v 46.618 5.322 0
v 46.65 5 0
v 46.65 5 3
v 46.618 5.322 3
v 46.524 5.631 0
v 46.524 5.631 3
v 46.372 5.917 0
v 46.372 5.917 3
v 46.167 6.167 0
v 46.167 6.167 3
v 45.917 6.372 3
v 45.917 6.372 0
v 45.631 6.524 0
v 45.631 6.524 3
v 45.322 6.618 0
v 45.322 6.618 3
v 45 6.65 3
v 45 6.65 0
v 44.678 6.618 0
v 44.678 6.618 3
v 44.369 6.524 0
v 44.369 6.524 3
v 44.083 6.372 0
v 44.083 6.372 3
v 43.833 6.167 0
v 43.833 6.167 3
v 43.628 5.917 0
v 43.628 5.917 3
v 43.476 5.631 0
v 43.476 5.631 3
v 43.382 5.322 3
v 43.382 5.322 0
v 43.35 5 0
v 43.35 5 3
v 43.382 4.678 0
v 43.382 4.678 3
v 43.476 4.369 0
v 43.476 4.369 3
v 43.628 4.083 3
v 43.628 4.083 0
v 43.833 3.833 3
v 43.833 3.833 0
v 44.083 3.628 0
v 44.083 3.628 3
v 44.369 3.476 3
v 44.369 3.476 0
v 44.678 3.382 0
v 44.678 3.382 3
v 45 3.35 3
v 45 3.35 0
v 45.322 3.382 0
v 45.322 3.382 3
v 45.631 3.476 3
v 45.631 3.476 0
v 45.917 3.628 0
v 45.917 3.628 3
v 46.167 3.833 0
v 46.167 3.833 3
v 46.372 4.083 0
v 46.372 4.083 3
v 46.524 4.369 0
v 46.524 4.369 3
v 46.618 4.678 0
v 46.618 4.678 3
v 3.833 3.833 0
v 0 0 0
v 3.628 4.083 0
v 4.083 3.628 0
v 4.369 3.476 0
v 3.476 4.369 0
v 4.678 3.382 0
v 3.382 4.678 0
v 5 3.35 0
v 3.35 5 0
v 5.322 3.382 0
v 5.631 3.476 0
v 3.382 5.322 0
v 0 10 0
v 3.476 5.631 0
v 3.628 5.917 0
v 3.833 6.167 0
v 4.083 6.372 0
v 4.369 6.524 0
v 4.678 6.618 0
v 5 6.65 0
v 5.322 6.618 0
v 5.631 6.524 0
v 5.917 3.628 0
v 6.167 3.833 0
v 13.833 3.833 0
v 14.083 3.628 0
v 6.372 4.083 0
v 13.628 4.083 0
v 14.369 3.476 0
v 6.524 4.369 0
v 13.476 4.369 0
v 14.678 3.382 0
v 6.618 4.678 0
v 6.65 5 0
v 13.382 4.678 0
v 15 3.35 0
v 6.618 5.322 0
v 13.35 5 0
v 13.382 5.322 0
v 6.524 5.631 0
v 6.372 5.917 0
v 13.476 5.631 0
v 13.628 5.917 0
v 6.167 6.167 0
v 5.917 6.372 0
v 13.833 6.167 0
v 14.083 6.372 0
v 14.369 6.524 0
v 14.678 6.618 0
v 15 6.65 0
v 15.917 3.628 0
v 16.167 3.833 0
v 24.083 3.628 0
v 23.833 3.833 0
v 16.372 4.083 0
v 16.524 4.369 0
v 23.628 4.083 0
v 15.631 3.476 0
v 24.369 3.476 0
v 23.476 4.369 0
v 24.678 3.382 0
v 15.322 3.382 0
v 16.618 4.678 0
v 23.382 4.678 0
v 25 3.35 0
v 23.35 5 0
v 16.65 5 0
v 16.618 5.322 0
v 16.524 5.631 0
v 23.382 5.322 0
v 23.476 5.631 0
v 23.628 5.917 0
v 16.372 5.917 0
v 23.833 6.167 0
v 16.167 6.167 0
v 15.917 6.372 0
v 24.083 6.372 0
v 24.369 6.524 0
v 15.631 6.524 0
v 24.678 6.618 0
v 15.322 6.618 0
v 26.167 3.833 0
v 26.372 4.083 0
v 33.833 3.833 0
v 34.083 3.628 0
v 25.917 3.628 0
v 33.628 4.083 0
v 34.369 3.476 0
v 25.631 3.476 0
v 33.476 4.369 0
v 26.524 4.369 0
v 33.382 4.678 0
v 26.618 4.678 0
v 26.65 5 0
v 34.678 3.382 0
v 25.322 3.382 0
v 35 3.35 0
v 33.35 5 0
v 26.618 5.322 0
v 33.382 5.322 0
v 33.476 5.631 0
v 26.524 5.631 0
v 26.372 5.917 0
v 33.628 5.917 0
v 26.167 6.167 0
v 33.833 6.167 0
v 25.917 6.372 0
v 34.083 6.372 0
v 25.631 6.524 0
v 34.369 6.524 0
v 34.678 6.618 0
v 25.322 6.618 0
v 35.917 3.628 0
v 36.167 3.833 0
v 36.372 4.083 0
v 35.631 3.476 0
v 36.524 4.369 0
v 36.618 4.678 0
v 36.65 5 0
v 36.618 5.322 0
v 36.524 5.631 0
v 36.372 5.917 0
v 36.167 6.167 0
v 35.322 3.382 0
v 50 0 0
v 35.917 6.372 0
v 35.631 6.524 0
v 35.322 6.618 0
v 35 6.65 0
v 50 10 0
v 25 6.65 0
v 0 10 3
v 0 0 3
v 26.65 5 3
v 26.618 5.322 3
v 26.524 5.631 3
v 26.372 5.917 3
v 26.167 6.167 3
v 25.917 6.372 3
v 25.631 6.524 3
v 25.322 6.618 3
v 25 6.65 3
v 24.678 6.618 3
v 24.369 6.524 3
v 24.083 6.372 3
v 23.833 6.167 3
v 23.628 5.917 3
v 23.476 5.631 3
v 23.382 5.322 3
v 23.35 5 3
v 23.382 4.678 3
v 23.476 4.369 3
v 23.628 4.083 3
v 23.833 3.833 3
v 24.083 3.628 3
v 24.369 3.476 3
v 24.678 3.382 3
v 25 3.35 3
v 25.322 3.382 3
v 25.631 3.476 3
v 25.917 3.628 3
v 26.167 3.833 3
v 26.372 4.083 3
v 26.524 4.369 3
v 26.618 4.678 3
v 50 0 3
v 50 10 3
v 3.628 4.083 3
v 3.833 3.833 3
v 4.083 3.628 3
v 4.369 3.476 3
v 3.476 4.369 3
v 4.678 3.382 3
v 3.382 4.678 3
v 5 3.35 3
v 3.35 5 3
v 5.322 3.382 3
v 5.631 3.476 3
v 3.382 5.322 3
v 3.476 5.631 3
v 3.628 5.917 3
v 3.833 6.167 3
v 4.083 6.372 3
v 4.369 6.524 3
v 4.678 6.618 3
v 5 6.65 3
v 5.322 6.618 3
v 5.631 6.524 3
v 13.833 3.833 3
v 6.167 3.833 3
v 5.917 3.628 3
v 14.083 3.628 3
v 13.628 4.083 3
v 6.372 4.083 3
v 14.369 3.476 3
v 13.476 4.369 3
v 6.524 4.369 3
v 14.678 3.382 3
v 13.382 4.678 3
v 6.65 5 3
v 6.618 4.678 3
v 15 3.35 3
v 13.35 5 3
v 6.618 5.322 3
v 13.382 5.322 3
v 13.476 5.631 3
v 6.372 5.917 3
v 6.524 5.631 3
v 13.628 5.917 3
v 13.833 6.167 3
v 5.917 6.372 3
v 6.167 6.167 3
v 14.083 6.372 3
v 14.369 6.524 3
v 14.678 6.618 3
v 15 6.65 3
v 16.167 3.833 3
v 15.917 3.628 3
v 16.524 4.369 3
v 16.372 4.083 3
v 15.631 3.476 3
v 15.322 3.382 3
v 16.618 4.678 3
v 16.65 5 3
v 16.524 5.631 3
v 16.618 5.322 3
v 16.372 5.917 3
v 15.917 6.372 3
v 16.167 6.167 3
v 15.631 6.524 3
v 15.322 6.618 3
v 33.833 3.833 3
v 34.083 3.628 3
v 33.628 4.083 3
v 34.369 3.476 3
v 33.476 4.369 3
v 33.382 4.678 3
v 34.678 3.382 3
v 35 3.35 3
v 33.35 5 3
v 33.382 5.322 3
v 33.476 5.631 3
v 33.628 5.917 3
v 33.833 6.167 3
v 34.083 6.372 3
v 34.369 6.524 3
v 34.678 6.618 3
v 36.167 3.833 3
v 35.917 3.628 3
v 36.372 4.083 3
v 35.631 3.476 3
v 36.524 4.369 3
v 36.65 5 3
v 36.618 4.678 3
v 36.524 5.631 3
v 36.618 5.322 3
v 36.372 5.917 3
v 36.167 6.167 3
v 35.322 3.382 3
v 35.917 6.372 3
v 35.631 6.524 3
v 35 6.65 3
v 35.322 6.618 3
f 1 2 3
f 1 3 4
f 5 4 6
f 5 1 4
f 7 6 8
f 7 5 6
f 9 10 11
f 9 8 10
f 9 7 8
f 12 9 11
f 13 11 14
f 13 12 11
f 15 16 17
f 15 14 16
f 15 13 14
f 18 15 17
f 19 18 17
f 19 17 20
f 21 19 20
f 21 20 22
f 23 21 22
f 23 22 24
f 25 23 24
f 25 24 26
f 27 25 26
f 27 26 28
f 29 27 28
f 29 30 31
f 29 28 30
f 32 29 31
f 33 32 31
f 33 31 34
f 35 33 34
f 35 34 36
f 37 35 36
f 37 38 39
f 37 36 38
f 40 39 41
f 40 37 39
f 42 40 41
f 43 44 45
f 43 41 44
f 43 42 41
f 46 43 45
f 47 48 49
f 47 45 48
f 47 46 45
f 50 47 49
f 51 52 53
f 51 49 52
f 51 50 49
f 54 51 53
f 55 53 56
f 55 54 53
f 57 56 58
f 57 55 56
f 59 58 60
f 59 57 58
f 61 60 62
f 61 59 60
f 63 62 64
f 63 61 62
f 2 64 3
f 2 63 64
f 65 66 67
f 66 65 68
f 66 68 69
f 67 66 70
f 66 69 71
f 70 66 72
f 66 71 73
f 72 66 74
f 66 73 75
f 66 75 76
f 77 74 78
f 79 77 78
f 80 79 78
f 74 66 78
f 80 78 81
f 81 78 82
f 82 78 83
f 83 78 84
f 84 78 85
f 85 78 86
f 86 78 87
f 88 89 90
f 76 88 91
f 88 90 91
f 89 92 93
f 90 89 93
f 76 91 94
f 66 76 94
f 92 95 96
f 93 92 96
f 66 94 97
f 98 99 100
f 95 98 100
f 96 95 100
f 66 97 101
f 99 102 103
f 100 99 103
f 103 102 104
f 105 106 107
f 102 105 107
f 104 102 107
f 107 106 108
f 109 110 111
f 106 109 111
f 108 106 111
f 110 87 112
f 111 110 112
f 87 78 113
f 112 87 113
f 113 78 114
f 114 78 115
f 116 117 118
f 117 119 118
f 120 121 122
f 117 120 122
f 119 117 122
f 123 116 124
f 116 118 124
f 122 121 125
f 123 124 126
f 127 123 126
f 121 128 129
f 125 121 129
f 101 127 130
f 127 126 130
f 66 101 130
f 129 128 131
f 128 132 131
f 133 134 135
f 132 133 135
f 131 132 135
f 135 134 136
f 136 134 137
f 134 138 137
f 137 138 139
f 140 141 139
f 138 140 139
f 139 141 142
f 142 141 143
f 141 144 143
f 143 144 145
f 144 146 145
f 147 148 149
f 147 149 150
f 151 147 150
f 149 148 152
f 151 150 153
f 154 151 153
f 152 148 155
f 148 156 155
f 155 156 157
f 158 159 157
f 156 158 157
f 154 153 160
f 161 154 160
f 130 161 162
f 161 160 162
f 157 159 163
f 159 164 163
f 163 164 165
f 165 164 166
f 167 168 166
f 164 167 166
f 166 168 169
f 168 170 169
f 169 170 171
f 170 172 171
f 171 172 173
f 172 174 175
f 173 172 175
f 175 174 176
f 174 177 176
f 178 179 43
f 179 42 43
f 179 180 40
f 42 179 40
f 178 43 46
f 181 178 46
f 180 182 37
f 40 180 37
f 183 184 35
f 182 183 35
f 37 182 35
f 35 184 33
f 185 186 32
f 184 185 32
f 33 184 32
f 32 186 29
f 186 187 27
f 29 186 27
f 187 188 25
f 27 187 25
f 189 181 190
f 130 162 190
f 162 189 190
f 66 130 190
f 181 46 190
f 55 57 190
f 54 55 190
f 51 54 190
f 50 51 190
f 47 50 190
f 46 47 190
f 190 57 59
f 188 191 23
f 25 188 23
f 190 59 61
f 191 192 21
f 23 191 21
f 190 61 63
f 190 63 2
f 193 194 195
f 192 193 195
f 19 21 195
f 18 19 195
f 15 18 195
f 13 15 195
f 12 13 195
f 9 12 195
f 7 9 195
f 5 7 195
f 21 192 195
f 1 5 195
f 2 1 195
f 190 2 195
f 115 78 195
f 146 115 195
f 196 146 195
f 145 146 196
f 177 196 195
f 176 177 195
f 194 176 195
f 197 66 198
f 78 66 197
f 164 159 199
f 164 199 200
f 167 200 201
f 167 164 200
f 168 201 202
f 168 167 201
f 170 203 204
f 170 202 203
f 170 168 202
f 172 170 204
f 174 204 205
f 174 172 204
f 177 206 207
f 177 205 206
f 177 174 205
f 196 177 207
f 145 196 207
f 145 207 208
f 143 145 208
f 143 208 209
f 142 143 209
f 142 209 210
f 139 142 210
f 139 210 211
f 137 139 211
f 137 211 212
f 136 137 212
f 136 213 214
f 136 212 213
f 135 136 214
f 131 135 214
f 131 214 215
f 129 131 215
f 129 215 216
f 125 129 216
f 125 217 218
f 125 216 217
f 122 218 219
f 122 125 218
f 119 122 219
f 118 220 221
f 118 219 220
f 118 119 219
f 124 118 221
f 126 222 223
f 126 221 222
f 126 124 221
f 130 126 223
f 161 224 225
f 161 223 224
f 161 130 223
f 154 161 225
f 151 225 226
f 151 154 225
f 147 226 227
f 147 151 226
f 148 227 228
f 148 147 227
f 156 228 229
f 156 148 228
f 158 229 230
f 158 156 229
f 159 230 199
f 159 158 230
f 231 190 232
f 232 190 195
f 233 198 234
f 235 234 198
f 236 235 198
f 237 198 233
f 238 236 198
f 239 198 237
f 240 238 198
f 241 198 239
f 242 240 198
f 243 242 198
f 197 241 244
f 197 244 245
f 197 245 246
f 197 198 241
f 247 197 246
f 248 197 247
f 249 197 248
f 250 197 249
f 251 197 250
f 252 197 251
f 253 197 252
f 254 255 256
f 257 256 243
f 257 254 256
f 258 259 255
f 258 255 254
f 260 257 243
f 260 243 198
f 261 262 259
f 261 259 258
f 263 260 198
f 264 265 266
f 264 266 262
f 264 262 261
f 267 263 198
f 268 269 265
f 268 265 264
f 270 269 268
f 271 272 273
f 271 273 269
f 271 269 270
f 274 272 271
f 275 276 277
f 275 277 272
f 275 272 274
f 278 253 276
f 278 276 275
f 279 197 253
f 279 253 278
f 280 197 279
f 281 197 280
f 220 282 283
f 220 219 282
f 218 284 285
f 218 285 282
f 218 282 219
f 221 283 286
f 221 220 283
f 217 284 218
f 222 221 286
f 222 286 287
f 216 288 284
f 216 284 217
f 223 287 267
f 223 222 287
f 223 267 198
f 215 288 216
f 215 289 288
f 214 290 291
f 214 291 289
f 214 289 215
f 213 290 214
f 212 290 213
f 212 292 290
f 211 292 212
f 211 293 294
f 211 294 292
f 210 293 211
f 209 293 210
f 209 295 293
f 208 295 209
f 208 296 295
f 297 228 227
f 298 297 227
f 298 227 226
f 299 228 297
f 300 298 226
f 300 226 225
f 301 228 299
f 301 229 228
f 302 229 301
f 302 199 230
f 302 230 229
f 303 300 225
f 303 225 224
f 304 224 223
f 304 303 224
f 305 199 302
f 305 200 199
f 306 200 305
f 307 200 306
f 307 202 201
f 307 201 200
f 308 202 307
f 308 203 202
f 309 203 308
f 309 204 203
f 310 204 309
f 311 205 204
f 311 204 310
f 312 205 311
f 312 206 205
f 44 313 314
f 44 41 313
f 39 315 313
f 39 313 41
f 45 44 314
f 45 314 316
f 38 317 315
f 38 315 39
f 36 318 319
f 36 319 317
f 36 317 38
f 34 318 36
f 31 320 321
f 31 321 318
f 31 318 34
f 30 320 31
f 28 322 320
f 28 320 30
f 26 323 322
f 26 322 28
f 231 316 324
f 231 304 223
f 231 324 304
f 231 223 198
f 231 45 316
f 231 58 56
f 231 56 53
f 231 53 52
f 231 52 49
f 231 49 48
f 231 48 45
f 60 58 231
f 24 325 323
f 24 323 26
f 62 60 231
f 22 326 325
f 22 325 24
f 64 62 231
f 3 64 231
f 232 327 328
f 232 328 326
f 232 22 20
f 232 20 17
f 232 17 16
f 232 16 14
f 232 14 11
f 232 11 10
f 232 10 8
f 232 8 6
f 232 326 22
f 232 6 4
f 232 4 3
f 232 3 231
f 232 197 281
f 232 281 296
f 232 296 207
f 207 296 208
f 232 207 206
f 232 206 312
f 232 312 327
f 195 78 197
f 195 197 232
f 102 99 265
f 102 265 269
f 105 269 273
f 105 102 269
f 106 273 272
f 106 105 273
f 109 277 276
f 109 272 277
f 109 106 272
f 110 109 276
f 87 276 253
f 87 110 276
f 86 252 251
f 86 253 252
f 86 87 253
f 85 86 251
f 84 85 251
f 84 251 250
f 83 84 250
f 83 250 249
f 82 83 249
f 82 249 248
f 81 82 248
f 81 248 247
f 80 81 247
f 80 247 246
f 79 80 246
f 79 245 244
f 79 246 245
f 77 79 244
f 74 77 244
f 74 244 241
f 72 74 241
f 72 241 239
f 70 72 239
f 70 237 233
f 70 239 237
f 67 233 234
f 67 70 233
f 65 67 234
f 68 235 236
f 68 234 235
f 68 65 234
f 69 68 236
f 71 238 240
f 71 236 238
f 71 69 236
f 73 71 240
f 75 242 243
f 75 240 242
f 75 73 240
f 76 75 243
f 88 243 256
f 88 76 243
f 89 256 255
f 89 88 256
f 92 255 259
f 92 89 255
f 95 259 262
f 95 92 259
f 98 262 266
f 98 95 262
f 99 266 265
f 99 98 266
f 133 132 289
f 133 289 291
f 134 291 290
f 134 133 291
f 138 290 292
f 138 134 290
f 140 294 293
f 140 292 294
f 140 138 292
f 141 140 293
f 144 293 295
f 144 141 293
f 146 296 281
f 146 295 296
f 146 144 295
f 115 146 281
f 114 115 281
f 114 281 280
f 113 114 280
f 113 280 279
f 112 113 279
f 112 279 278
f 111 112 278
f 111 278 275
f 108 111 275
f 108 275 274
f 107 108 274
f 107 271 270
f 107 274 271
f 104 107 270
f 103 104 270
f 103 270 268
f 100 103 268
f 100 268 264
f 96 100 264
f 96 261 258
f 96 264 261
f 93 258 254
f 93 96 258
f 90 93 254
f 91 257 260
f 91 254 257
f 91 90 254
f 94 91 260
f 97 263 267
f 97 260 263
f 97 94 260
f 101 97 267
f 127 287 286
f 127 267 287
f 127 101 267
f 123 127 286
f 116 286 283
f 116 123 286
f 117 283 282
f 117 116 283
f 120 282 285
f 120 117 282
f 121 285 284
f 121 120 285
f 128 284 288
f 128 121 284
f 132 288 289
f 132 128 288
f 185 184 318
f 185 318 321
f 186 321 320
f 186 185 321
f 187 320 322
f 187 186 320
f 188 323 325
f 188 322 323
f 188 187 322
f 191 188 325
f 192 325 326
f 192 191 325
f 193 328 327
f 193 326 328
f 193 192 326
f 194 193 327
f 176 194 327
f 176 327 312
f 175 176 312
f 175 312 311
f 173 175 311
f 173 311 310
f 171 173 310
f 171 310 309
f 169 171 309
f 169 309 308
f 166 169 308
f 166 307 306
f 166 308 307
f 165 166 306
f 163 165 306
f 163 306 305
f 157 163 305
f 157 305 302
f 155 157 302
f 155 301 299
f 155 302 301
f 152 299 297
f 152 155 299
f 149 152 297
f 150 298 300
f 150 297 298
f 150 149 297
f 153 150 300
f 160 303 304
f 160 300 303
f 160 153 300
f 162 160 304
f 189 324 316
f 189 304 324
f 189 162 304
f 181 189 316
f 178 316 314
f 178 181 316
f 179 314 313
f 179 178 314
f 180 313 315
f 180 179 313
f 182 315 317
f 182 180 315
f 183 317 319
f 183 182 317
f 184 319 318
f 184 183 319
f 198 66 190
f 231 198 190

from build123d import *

# Parameters (mm, degrees)
CYLINDER001_R     = 1.65
CYLINDER001_DEPTH = 10
CYLINDER002_R     = 1.65
CYLINDER002_DEPTH = 10
CYLINDER003_R     = 1.65
CYLINDER003_DEPTH = 10
CYLINDER004_R     = 1.65
CYLINDER004_DEPTH = 10
CYLINDER_R        = 1.65
CYLINDER_DEPTH    = 10
BOX_W             = 50
BOX_H             = 10
BOX_DEPTH         = 3


with BuildPart() as taladro002:
    # Cylinder001 → Cylinder001 (new body)
    with BuildSketch(Plane(origin=(15, 5, -4), x_dir=(1, 0, 0), z_dir=(0, 0, 1))):
        Circle(CYLINDER001_R)
    extrude(amount=CYLINDER001_DEPTH)


with BuildPart() as taladro003:
    # Cylinder002 → Cylinder002 (new body)
    with BuildSketch(Plane(origin=(25, 5, -4), x_dir=(1, 0, 0), z_dir=(0, 0, 1))):
        Circle(CYLINDER002_R)
    extrude(amount=CYLINDER002_DEPTH)


with BuildPart() as taladro004:
    # Cylinder003 → Cylinder003 (new body)
    with BuildSketch(Plane(origin=(35, 5, -4), x_dir=(1, 0, 0), z_dir=(0, 0, 1))):
        Circle(CYLINDER003_R)
    extrude(amount=CYLINDER003_DEPTH)


with BuildPart() as taladro005:
    # Cylinder004 → Cylinder004 (new body)
    with BuildSketch(Plane(origin=(45, 5, -4), x_dir=(1, 0, 0), z_dir=(0, 0, 1))):
        Circle(CYLINDER004_R)
    extrude(amount=CYLINDER004_DEPTH)


with BuildPart() as taladros:
    # Cylinder → Cylinder (new body)
    with BuildSketch(Plane(origin=(5, 5, -4), x_dir=(1, 0, 0), z_dir=(0, 0, 1))):
        Circle(CYLINDER_R)
    extrude(amount=CYLINDER_DEPTH)

    # Fusion: union taladro002, taladro003, taladro004, taladro005
    add(taladro002.part)
    add(taladro003.part)
    add(taladro004.part)
    add(taladro005.part)


with BuildPart() as pieza_final:
    # Box → Box (new body)
    with BuildSketch(Plane.XY):
        with Locations((25, 5)):
            Rectangle(BOX_W, BOX_H)
    extrude(amount=BOX_DEPTH)

    # Cut: cut Taladros
    add(taladros.part, mode=Mode.SUBTRACT)


solid = pieza_final.part
